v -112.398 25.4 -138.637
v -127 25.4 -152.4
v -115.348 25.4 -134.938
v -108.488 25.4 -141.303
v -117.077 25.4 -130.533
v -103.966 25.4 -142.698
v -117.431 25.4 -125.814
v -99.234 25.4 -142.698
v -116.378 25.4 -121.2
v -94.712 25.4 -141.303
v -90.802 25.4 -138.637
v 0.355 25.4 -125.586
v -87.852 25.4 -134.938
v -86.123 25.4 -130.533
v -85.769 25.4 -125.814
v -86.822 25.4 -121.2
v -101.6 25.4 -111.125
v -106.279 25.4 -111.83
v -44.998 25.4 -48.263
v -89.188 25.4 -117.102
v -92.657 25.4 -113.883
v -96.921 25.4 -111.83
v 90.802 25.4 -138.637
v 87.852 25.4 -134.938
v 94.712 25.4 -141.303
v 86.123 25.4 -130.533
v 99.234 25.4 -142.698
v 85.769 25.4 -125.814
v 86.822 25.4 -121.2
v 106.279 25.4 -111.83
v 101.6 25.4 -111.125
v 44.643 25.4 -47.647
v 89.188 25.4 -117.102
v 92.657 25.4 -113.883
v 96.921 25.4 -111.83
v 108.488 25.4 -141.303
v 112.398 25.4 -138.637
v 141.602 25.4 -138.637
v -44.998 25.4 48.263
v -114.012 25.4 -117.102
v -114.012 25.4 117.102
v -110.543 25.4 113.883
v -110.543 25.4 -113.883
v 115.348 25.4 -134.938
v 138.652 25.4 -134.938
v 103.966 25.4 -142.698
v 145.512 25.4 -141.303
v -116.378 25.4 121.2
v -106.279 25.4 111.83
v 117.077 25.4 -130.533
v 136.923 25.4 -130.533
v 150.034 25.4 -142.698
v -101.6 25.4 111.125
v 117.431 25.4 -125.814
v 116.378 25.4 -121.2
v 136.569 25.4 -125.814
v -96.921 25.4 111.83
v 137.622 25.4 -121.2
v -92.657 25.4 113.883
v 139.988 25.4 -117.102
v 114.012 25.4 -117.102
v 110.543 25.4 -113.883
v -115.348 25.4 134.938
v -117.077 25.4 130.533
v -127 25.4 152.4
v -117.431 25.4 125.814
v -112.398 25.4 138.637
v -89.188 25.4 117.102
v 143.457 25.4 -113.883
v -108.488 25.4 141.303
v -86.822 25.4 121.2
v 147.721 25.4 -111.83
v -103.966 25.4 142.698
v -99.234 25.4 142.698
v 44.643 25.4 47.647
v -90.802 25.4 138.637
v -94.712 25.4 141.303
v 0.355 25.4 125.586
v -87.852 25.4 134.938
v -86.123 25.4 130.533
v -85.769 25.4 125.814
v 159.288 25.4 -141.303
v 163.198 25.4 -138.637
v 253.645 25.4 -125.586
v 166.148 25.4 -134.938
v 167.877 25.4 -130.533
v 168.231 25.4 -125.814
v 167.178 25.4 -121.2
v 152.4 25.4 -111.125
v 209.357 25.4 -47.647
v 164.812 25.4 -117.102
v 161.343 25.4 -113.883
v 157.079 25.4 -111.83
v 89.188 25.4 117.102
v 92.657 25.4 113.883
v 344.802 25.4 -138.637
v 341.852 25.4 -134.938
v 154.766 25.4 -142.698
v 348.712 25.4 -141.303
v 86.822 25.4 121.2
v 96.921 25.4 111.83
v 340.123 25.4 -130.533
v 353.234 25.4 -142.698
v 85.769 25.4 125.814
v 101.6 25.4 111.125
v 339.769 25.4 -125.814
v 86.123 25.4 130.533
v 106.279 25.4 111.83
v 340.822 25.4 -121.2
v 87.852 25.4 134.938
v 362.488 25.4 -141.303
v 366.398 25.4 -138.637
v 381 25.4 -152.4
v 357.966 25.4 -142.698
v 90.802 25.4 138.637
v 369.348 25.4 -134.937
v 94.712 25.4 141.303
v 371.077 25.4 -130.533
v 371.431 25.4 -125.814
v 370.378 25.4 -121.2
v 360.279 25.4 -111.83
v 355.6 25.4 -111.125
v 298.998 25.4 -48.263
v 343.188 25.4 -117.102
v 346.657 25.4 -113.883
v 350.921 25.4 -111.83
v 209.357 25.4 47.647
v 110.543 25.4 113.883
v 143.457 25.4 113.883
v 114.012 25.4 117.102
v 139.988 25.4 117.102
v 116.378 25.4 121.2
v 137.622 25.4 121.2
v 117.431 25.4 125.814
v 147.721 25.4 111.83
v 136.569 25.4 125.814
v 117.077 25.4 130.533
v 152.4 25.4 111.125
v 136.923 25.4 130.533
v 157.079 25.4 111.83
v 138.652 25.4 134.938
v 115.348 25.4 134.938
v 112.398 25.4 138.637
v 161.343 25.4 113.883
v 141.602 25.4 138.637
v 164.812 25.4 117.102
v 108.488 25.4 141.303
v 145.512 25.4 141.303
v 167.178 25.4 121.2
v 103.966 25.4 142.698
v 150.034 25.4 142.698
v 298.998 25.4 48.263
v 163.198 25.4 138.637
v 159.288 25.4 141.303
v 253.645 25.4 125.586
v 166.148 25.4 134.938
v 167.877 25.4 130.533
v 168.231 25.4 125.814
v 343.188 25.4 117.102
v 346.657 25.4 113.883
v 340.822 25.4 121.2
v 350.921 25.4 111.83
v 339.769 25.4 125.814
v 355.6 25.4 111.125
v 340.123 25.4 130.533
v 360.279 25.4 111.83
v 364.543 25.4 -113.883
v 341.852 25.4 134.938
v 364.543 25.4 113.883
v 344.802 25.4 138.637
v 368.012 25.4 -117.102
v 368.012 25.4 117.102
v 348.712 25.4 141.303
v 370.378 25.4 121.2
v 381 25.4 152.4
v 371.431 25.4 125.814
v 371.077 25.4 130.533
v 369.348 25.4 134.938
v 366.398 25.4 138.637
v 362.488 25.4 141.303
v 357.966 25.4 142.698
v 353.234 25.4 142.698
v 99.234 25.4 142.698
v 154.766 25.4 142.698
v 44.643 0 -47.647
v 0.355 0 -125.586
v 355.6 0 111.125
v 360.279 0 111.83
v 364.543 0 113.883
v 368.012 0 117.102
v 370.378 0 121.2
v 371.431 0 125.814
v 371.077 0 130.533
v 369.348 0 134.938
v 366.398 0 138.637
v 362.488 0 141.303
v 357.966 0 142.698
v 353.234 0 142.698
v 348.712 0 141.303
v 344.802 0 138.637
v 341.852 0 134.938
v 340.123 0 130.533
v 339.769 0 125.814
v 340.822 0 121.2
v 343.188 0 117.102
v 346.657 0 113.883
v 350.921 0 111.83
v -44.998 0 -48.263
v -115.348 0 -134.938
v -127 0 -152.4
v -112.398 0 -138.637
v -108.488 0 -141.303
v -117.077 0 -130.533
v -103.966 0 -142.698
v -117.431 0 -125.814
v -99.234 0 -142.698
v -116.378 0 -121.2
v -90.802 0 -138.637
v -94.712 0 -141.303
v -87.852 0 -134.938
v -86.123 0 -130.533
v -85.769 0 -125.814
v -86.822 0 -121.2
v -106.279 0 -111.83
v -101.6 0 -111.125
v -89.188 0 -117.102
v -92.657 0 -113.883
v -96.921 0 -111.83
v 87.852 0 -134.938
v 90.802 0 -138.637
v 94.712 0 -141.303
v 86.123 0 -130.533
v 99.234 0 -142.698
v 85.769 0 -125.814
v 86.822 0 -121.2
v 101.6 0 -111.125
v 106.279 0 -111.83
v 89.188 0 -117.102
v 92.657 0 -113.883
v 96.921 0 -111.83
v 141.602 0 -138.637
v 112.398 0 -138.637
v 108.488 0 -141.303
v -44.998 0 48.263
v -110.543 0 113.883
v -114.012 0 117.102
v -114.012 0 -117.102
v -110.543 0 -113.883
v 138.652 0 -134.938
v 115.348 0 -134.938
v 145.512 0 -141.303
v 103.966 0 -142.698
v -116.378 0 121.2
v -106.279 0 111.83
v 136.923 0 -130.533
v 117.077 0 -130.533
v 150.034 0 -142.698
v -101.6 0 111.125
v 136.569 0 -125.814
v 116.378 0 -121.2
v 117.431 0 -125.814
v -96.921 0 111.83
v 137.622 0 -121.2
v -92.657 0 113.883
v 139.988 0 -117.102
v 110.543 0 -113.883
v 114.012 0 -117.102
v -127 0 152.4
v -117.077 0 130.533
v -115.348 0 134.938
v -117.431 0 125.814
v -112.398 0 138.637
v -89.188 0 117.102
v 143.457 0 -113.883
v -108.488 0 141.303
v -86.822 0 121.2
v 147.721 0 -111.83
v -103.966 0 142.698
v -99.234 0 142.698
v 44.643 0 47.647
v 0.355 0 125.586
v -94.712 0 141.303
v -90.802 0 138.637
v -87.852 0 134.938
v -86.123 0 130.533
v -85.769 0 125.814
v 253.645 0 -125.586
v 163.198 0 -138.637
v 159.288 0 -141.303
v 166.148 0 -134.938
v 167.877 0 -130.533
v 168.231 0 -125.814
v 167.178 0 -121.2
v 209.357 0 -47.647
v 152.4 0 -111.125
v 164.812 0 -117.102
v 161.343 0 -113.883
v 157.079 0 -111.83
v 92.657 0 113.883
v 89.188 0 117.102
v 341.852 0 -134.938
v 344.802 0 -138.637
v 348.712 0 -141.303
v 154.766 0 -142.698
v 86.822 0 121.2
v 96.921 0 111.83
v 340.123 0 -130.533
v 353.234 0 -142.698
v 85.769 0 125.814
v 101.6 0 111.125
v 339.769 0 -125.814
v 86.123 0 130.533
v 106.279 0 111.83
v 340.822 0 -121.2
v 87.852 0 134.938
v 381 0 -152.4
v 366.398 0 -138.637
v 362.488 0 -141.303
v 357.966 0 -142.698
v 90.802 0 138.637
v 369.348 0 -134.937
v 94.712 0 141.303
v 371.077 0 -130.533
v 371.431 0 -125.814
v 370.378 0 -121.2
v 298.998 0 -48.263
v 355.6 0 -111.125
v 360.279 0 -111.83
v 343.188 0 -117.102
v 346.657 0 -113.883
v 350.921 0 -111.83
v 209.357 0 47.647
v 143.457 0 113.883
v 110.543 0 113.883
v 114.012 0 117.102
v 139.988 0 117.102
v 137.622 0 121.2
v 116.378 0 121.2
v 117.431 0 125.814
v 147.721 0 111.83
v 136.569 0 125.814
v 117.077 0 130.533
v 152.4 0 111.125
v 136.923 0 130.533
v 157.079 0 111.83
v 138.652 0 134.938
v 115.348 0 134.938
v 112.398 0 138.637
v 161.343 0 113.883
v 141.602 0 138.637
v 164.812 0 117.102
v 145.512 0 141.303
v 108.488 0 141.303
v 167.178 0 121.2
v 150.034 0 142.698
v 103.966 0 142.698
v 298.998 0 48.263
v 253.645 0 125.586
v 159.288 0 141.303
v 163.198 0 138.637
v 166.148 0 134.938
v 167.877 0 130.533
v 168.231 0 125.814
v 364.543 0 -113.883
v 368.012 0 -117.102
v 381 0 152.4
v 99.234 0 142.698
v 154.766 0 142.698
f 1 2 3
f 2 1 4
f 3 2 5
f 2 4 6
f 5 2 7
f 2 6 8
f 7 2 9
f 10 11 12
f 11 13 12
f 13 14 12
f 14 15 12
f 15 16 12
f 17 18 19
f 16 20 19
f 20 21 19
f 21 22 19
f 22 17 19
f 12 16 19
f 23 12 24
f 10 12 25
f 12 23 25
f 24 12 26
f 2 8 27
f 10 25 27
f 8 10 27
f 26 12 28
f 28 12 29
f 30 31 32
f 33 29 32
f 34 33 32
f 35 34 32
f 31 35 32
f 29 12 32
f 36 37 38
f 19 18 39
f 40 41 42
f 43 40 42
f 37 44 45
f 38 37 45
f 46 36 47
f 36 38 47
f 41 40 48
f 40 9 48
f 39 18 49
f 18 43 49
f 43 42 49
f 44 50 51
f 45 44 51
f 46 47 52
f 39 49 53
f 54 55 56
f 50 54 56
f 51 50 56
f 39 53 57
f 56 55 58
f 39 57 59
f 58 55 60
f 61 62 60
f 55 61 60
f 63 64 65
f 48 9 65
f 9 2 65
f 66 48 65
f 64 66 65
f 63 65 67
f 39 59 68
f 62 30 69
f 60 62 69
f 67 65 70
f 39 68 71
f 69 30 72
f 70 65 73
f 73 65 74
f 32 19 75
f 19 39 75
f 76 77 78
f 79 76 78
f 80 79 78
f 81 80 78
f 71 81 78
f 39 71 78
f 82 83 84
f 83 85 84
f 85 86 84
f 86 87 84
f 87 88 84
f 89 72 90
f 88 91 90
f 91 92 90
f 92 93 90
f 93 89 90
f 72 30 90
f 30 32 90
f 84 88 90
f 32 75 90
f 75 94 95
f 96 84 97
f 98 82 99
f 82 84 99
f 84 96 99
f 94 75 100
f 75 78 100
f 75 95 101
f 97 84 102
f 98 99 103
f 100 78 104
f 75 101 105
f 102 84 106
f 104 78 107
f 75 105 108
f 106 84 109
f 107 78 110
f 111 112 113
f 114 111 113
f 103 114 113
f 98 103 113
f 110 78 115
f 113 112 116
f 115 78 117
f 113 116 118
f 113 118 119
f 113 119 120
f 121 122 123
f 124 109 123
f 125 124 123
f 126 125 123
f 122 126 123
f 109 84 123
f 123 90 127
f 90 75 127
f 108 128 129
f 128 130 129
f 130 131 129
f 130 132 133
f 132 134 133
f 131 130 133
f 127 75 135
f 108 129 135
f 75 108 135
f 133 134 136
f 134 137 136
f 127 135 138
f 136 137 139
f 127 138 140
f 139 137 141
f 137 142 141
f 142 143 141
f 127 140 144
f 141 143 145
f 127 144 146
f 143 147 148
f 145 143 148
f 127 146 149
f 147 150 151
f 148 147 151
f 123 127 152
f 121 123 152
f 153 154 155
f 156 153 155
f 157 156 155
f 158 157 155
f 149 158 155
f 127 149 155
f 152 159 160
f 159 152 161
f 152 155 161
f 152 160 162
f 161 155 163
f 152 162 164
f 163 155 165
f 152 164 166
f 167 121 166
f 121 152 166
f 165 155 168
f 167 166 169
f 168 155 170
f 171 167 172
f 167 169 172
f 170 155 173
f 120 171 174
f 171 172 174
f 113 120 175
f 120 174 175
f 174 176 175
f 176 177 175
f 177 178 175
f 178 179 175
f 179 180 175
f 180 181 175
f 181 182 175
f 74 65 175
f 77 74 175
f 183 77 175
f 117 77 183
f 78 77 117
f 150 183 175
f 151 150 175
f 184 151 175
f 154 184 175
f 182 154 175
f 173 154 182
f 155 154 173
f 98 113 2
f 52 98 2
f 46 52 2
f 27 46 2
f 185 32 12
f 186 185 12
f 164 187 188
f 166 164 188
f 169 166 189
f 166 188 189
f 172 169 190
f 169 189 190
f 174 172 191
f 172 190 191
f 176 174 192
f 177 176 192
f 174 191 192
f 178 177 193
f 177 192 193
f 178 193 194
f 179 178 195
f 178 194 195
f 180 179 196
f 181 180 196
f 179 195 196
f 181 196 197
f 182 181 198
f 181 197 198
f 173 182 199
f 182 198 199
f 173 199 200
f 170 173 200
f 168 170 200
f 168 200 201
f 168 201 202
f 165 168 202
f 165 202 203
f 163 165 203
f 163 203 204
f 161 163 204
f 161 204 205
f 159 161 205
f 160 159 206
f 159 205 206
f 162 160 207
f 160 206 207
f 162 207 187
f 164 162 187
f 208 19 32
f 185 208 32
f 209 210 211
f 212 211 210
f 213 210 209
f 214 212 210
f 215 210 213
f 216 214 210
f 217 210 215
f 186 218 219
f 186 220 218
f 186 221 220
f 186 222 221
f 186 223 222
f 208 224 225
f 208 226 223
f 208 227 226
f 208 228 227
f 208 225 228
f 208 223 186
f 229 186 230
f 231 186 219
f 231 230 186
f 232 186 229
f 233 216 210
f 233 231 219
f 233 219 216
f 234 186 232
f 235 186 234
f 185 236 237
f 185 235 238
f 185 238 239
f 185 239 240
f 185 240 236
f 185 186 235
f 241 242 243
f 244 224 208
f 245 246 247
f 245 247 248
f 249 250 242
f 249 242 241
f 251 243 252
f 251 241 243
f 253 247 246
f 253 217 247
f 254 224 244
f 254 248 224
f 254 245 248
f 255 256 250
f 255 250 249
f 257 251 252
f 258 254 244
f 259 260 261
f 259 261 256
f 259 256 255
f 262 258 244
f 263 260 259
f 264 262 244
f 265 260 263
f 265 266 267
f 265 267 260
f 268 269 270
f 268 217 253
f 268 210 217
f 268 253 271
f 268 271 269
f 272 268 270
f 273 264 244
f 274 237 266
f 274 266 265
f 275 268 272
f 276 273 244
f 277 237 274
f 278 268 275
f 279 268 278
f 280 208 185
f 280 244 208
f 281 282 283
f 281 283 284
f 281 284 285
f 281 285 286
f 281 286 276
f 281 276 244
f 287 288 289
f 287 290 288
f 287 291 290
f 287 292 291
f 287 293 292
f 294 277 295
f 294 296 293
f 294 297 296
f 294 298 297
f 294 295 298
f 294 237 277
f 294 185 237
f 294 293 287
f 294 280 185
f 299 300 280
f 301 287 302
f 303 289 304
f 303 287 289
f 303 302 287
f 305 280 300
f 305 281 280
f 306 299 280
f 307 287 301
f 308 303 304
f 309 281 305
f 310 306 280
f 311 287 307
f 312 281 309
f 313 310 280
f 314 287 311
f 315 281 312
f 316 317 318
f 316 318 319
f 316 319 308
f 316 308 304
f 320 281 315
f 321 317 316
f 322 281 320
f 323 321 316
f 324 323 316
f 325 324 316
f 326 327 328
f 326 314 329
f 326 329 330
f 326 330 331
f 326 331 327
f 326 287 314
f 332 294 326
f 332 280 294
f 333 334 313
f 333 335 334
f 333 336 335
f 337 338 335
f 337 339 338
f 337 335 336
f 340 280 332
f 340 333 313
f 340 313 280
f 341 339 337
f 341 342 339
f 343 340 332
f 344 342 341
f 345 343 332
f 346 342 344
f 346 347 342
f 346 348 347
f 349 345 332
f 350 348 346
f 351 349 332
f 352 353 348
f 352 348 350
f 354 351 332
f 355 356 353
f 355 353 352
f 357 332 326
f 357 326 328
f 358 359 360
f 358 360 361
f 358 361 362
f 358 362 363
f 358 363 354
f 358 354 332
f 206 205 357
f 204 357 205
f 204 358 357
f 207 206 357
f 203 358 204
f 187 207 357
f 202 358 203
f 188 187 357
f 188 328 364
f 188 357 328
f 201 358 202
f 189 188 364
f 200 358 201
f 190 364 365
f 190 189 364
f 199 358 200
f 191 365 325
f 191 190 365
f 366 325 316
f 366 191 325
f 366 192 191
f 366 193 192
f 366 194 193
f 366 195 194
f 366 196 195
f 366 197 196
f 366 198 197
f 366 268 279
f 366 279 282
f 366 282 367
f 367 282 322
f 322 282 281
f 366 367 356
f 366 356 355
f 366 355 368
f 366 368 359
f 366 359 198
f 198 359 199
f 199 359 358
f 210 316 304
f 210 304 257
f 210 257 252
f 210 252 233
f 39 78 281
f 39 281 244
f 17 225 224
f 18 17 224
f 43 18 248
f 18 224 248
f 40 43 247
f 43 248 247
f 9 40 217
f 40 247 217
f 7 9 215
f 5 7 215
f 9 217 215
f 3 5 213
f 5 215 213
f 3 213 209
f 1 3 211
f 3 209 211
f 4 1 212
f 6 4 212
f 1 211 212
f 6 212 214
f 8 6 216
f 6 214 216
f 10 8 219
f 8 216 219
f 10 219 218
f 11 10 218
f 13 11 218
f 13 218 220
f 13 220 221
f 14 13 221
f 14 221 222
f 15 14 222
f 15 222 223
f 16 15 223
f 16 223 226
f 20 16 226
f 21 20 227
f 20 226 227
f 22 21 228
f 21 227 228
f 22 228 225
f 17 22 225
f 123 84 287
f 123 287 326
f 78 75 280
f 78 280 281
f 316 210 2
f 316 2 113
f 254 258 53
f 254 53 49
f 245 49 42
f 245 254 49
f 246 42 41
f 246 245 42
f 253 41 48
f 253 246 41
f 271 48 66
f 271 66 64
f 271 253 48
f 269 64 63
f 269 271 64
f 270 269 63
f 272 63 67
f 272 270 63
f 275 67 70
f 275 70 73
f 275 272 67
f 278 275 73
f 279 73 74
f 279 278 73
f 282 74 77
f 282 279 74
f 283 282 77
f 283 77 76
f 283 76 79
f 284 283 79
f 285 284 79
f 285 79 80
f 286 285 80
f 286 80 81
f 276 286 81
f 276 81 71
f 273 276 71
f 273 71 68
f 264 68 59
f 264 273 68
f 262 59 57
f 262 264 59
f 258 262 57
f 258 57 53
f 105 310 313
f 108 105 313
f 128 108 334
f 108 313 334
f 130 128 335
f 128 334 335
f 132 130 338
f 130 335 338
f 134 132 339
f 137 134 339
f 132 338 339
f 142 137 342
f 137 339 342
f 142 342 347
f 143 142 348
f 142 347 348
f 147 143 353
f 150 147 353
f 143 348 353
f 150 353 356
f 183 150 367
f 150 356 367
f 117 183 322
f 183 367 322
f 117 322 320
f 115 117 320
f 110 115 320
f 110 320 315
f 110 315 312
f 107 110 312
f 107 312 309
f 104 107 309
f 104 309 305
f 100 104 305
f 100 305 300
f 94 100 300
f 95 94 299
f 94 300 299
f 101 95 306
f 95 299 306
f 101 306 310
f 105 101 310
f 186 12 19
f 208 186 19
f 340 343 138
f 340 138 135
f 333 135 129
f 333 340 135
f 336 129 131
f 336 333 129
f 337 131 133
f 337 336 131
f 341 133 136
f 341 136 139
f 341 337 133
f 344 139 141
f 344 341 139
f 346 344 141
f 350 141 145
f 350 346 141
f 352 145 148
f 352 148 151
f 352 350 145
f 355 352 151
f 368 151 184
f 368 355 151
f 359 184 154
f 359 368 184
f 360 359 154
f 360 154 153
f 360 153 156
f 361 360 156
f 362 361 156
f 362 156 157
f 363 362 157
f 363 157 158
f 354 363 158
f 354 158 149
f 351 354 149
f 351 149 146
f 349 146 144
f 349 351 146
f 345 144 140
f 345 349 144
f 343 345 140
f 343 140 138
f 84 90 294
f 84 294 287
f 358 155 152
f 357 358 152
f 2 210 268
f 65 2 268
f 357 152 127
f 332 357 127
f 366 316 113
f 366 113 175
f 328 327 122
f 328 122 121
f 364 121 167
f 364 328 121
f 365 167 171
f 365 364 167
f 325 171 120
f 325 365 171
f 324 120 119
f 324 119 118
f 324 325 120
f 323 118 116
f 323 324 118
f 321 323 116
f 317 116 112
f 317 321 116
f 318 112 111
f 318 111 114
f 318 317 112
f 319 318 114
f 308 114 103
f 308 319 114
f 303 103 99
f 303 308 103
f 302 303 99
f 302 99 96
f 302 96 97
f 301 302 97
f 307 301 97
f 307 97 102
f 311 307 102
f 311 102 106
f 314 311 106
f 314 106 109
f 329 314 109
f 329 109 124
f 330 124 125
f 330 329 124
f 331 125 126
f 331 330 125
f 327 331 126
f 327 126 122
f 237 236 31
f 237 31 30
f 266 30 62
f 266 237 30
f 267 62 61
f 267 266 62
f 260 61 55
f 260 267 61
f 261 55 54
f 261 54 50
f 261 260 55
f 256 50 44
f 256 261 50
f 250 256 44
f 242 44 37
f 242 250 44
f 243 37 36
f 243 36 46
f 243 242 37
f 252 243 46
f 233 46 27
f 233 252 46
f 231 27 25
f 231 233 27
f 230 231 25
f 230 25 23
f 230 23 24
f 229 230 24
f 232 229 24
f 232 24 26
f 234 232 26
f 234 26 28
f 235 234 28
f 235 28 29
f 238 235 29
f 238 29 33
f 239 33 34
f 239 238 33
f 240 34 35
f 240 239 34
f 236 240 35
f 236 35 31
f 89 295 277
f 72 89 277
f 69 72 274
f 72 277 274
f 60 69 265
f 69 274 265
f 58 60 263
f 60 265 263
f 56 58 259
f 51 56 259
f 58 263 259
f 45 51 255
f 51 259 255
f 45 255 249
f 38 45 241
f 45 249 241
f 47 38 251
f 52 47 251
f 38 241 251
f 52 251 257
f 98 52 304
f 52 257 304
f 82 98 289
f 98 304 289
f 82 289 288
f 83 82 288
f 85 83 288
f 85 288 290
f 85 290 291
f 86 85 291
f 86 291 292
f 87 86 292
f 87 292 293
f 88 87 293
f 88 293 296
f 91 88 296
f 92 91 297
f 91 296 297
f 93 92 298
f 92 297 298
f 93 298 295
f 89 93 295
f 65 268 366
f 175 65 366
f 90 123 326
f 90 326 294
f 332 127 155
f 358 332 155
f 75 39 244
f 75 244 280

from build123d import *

# Parameters (mm, degrees)
SKETCH1_W           = 127
SKETCH1_H           = 152.4
SKETCH1_R           = 15.875
BOSS_EXTRUDE1_DEPTH = 25.4
CUT_EXTRUDE1_DEPTH  = 25.4


with BuildPart() as part:
    # Sketch1 → Boss-Extrude1 (new body)
    with BuildSketch(Plane(origin=(0, 0, 0), x_dir=(1, 0, 0), z_dir=(0, 1, 0))):
        with Locations((63.5, 76.2)):
            Rectangle(SKETCH1_W, SKETCH1_H)
        with Locations(Location((101.6, 127, 0), (0, 0, 270))):
            Circle(SKETCH1_R, mode=Mode.SUBTRACT)
    boss_extrude1 = extrude(amount=BOSS_EXTRUDE1_DEPTH)

    # Mirror1: Boss-Extrude1 across plane
    add(boss_extrude1.mirror(Plane(origin=(0, 25.4, 0), x_dir=(1, 0, 0), z_dir=(0, 0, -1))))

    # Mirror2: part across plane


with BuildPart() as part_1:
    add(part.part)
    add(part.part.mirror(Plane(origin=(0, 25.4, -152.4), x_dir=(0, 0, 1), z_dir=(1, 0, 0))))

    # Sketch2 → Cut-Extrude1 (cut)
    with BuildSketch(Plane(origin=(0, 25.4, 0), x_dir=(1, 0, 0), z_dir=(0, 1, 0))):
        Polygon((44.642701317, 47.647498522), (0.35523126, 125.58620398), (-44.997932577, 48.262777112), align=None)
    cut_extrude1 = extrude(amount=-CUT_EXTRUDE1_DEPTH, mode=Mode.SUBTRACT)

    # Mirror3: Cut-Extrude1 across plane
    add(cut_extrude1.mirror(Plane.XY), mode=Mode.SUBTRACT)

    # Mirror4: part across plane


with BuildPart() as part_2:
    add(part_1.part)
    add(part_1.part.mirror(Plane(origin=(127, 25.4, -152.4), x_dir=(0, 0, 1), z_dir=(-1, 0, 0))))


solid = part_2.part
